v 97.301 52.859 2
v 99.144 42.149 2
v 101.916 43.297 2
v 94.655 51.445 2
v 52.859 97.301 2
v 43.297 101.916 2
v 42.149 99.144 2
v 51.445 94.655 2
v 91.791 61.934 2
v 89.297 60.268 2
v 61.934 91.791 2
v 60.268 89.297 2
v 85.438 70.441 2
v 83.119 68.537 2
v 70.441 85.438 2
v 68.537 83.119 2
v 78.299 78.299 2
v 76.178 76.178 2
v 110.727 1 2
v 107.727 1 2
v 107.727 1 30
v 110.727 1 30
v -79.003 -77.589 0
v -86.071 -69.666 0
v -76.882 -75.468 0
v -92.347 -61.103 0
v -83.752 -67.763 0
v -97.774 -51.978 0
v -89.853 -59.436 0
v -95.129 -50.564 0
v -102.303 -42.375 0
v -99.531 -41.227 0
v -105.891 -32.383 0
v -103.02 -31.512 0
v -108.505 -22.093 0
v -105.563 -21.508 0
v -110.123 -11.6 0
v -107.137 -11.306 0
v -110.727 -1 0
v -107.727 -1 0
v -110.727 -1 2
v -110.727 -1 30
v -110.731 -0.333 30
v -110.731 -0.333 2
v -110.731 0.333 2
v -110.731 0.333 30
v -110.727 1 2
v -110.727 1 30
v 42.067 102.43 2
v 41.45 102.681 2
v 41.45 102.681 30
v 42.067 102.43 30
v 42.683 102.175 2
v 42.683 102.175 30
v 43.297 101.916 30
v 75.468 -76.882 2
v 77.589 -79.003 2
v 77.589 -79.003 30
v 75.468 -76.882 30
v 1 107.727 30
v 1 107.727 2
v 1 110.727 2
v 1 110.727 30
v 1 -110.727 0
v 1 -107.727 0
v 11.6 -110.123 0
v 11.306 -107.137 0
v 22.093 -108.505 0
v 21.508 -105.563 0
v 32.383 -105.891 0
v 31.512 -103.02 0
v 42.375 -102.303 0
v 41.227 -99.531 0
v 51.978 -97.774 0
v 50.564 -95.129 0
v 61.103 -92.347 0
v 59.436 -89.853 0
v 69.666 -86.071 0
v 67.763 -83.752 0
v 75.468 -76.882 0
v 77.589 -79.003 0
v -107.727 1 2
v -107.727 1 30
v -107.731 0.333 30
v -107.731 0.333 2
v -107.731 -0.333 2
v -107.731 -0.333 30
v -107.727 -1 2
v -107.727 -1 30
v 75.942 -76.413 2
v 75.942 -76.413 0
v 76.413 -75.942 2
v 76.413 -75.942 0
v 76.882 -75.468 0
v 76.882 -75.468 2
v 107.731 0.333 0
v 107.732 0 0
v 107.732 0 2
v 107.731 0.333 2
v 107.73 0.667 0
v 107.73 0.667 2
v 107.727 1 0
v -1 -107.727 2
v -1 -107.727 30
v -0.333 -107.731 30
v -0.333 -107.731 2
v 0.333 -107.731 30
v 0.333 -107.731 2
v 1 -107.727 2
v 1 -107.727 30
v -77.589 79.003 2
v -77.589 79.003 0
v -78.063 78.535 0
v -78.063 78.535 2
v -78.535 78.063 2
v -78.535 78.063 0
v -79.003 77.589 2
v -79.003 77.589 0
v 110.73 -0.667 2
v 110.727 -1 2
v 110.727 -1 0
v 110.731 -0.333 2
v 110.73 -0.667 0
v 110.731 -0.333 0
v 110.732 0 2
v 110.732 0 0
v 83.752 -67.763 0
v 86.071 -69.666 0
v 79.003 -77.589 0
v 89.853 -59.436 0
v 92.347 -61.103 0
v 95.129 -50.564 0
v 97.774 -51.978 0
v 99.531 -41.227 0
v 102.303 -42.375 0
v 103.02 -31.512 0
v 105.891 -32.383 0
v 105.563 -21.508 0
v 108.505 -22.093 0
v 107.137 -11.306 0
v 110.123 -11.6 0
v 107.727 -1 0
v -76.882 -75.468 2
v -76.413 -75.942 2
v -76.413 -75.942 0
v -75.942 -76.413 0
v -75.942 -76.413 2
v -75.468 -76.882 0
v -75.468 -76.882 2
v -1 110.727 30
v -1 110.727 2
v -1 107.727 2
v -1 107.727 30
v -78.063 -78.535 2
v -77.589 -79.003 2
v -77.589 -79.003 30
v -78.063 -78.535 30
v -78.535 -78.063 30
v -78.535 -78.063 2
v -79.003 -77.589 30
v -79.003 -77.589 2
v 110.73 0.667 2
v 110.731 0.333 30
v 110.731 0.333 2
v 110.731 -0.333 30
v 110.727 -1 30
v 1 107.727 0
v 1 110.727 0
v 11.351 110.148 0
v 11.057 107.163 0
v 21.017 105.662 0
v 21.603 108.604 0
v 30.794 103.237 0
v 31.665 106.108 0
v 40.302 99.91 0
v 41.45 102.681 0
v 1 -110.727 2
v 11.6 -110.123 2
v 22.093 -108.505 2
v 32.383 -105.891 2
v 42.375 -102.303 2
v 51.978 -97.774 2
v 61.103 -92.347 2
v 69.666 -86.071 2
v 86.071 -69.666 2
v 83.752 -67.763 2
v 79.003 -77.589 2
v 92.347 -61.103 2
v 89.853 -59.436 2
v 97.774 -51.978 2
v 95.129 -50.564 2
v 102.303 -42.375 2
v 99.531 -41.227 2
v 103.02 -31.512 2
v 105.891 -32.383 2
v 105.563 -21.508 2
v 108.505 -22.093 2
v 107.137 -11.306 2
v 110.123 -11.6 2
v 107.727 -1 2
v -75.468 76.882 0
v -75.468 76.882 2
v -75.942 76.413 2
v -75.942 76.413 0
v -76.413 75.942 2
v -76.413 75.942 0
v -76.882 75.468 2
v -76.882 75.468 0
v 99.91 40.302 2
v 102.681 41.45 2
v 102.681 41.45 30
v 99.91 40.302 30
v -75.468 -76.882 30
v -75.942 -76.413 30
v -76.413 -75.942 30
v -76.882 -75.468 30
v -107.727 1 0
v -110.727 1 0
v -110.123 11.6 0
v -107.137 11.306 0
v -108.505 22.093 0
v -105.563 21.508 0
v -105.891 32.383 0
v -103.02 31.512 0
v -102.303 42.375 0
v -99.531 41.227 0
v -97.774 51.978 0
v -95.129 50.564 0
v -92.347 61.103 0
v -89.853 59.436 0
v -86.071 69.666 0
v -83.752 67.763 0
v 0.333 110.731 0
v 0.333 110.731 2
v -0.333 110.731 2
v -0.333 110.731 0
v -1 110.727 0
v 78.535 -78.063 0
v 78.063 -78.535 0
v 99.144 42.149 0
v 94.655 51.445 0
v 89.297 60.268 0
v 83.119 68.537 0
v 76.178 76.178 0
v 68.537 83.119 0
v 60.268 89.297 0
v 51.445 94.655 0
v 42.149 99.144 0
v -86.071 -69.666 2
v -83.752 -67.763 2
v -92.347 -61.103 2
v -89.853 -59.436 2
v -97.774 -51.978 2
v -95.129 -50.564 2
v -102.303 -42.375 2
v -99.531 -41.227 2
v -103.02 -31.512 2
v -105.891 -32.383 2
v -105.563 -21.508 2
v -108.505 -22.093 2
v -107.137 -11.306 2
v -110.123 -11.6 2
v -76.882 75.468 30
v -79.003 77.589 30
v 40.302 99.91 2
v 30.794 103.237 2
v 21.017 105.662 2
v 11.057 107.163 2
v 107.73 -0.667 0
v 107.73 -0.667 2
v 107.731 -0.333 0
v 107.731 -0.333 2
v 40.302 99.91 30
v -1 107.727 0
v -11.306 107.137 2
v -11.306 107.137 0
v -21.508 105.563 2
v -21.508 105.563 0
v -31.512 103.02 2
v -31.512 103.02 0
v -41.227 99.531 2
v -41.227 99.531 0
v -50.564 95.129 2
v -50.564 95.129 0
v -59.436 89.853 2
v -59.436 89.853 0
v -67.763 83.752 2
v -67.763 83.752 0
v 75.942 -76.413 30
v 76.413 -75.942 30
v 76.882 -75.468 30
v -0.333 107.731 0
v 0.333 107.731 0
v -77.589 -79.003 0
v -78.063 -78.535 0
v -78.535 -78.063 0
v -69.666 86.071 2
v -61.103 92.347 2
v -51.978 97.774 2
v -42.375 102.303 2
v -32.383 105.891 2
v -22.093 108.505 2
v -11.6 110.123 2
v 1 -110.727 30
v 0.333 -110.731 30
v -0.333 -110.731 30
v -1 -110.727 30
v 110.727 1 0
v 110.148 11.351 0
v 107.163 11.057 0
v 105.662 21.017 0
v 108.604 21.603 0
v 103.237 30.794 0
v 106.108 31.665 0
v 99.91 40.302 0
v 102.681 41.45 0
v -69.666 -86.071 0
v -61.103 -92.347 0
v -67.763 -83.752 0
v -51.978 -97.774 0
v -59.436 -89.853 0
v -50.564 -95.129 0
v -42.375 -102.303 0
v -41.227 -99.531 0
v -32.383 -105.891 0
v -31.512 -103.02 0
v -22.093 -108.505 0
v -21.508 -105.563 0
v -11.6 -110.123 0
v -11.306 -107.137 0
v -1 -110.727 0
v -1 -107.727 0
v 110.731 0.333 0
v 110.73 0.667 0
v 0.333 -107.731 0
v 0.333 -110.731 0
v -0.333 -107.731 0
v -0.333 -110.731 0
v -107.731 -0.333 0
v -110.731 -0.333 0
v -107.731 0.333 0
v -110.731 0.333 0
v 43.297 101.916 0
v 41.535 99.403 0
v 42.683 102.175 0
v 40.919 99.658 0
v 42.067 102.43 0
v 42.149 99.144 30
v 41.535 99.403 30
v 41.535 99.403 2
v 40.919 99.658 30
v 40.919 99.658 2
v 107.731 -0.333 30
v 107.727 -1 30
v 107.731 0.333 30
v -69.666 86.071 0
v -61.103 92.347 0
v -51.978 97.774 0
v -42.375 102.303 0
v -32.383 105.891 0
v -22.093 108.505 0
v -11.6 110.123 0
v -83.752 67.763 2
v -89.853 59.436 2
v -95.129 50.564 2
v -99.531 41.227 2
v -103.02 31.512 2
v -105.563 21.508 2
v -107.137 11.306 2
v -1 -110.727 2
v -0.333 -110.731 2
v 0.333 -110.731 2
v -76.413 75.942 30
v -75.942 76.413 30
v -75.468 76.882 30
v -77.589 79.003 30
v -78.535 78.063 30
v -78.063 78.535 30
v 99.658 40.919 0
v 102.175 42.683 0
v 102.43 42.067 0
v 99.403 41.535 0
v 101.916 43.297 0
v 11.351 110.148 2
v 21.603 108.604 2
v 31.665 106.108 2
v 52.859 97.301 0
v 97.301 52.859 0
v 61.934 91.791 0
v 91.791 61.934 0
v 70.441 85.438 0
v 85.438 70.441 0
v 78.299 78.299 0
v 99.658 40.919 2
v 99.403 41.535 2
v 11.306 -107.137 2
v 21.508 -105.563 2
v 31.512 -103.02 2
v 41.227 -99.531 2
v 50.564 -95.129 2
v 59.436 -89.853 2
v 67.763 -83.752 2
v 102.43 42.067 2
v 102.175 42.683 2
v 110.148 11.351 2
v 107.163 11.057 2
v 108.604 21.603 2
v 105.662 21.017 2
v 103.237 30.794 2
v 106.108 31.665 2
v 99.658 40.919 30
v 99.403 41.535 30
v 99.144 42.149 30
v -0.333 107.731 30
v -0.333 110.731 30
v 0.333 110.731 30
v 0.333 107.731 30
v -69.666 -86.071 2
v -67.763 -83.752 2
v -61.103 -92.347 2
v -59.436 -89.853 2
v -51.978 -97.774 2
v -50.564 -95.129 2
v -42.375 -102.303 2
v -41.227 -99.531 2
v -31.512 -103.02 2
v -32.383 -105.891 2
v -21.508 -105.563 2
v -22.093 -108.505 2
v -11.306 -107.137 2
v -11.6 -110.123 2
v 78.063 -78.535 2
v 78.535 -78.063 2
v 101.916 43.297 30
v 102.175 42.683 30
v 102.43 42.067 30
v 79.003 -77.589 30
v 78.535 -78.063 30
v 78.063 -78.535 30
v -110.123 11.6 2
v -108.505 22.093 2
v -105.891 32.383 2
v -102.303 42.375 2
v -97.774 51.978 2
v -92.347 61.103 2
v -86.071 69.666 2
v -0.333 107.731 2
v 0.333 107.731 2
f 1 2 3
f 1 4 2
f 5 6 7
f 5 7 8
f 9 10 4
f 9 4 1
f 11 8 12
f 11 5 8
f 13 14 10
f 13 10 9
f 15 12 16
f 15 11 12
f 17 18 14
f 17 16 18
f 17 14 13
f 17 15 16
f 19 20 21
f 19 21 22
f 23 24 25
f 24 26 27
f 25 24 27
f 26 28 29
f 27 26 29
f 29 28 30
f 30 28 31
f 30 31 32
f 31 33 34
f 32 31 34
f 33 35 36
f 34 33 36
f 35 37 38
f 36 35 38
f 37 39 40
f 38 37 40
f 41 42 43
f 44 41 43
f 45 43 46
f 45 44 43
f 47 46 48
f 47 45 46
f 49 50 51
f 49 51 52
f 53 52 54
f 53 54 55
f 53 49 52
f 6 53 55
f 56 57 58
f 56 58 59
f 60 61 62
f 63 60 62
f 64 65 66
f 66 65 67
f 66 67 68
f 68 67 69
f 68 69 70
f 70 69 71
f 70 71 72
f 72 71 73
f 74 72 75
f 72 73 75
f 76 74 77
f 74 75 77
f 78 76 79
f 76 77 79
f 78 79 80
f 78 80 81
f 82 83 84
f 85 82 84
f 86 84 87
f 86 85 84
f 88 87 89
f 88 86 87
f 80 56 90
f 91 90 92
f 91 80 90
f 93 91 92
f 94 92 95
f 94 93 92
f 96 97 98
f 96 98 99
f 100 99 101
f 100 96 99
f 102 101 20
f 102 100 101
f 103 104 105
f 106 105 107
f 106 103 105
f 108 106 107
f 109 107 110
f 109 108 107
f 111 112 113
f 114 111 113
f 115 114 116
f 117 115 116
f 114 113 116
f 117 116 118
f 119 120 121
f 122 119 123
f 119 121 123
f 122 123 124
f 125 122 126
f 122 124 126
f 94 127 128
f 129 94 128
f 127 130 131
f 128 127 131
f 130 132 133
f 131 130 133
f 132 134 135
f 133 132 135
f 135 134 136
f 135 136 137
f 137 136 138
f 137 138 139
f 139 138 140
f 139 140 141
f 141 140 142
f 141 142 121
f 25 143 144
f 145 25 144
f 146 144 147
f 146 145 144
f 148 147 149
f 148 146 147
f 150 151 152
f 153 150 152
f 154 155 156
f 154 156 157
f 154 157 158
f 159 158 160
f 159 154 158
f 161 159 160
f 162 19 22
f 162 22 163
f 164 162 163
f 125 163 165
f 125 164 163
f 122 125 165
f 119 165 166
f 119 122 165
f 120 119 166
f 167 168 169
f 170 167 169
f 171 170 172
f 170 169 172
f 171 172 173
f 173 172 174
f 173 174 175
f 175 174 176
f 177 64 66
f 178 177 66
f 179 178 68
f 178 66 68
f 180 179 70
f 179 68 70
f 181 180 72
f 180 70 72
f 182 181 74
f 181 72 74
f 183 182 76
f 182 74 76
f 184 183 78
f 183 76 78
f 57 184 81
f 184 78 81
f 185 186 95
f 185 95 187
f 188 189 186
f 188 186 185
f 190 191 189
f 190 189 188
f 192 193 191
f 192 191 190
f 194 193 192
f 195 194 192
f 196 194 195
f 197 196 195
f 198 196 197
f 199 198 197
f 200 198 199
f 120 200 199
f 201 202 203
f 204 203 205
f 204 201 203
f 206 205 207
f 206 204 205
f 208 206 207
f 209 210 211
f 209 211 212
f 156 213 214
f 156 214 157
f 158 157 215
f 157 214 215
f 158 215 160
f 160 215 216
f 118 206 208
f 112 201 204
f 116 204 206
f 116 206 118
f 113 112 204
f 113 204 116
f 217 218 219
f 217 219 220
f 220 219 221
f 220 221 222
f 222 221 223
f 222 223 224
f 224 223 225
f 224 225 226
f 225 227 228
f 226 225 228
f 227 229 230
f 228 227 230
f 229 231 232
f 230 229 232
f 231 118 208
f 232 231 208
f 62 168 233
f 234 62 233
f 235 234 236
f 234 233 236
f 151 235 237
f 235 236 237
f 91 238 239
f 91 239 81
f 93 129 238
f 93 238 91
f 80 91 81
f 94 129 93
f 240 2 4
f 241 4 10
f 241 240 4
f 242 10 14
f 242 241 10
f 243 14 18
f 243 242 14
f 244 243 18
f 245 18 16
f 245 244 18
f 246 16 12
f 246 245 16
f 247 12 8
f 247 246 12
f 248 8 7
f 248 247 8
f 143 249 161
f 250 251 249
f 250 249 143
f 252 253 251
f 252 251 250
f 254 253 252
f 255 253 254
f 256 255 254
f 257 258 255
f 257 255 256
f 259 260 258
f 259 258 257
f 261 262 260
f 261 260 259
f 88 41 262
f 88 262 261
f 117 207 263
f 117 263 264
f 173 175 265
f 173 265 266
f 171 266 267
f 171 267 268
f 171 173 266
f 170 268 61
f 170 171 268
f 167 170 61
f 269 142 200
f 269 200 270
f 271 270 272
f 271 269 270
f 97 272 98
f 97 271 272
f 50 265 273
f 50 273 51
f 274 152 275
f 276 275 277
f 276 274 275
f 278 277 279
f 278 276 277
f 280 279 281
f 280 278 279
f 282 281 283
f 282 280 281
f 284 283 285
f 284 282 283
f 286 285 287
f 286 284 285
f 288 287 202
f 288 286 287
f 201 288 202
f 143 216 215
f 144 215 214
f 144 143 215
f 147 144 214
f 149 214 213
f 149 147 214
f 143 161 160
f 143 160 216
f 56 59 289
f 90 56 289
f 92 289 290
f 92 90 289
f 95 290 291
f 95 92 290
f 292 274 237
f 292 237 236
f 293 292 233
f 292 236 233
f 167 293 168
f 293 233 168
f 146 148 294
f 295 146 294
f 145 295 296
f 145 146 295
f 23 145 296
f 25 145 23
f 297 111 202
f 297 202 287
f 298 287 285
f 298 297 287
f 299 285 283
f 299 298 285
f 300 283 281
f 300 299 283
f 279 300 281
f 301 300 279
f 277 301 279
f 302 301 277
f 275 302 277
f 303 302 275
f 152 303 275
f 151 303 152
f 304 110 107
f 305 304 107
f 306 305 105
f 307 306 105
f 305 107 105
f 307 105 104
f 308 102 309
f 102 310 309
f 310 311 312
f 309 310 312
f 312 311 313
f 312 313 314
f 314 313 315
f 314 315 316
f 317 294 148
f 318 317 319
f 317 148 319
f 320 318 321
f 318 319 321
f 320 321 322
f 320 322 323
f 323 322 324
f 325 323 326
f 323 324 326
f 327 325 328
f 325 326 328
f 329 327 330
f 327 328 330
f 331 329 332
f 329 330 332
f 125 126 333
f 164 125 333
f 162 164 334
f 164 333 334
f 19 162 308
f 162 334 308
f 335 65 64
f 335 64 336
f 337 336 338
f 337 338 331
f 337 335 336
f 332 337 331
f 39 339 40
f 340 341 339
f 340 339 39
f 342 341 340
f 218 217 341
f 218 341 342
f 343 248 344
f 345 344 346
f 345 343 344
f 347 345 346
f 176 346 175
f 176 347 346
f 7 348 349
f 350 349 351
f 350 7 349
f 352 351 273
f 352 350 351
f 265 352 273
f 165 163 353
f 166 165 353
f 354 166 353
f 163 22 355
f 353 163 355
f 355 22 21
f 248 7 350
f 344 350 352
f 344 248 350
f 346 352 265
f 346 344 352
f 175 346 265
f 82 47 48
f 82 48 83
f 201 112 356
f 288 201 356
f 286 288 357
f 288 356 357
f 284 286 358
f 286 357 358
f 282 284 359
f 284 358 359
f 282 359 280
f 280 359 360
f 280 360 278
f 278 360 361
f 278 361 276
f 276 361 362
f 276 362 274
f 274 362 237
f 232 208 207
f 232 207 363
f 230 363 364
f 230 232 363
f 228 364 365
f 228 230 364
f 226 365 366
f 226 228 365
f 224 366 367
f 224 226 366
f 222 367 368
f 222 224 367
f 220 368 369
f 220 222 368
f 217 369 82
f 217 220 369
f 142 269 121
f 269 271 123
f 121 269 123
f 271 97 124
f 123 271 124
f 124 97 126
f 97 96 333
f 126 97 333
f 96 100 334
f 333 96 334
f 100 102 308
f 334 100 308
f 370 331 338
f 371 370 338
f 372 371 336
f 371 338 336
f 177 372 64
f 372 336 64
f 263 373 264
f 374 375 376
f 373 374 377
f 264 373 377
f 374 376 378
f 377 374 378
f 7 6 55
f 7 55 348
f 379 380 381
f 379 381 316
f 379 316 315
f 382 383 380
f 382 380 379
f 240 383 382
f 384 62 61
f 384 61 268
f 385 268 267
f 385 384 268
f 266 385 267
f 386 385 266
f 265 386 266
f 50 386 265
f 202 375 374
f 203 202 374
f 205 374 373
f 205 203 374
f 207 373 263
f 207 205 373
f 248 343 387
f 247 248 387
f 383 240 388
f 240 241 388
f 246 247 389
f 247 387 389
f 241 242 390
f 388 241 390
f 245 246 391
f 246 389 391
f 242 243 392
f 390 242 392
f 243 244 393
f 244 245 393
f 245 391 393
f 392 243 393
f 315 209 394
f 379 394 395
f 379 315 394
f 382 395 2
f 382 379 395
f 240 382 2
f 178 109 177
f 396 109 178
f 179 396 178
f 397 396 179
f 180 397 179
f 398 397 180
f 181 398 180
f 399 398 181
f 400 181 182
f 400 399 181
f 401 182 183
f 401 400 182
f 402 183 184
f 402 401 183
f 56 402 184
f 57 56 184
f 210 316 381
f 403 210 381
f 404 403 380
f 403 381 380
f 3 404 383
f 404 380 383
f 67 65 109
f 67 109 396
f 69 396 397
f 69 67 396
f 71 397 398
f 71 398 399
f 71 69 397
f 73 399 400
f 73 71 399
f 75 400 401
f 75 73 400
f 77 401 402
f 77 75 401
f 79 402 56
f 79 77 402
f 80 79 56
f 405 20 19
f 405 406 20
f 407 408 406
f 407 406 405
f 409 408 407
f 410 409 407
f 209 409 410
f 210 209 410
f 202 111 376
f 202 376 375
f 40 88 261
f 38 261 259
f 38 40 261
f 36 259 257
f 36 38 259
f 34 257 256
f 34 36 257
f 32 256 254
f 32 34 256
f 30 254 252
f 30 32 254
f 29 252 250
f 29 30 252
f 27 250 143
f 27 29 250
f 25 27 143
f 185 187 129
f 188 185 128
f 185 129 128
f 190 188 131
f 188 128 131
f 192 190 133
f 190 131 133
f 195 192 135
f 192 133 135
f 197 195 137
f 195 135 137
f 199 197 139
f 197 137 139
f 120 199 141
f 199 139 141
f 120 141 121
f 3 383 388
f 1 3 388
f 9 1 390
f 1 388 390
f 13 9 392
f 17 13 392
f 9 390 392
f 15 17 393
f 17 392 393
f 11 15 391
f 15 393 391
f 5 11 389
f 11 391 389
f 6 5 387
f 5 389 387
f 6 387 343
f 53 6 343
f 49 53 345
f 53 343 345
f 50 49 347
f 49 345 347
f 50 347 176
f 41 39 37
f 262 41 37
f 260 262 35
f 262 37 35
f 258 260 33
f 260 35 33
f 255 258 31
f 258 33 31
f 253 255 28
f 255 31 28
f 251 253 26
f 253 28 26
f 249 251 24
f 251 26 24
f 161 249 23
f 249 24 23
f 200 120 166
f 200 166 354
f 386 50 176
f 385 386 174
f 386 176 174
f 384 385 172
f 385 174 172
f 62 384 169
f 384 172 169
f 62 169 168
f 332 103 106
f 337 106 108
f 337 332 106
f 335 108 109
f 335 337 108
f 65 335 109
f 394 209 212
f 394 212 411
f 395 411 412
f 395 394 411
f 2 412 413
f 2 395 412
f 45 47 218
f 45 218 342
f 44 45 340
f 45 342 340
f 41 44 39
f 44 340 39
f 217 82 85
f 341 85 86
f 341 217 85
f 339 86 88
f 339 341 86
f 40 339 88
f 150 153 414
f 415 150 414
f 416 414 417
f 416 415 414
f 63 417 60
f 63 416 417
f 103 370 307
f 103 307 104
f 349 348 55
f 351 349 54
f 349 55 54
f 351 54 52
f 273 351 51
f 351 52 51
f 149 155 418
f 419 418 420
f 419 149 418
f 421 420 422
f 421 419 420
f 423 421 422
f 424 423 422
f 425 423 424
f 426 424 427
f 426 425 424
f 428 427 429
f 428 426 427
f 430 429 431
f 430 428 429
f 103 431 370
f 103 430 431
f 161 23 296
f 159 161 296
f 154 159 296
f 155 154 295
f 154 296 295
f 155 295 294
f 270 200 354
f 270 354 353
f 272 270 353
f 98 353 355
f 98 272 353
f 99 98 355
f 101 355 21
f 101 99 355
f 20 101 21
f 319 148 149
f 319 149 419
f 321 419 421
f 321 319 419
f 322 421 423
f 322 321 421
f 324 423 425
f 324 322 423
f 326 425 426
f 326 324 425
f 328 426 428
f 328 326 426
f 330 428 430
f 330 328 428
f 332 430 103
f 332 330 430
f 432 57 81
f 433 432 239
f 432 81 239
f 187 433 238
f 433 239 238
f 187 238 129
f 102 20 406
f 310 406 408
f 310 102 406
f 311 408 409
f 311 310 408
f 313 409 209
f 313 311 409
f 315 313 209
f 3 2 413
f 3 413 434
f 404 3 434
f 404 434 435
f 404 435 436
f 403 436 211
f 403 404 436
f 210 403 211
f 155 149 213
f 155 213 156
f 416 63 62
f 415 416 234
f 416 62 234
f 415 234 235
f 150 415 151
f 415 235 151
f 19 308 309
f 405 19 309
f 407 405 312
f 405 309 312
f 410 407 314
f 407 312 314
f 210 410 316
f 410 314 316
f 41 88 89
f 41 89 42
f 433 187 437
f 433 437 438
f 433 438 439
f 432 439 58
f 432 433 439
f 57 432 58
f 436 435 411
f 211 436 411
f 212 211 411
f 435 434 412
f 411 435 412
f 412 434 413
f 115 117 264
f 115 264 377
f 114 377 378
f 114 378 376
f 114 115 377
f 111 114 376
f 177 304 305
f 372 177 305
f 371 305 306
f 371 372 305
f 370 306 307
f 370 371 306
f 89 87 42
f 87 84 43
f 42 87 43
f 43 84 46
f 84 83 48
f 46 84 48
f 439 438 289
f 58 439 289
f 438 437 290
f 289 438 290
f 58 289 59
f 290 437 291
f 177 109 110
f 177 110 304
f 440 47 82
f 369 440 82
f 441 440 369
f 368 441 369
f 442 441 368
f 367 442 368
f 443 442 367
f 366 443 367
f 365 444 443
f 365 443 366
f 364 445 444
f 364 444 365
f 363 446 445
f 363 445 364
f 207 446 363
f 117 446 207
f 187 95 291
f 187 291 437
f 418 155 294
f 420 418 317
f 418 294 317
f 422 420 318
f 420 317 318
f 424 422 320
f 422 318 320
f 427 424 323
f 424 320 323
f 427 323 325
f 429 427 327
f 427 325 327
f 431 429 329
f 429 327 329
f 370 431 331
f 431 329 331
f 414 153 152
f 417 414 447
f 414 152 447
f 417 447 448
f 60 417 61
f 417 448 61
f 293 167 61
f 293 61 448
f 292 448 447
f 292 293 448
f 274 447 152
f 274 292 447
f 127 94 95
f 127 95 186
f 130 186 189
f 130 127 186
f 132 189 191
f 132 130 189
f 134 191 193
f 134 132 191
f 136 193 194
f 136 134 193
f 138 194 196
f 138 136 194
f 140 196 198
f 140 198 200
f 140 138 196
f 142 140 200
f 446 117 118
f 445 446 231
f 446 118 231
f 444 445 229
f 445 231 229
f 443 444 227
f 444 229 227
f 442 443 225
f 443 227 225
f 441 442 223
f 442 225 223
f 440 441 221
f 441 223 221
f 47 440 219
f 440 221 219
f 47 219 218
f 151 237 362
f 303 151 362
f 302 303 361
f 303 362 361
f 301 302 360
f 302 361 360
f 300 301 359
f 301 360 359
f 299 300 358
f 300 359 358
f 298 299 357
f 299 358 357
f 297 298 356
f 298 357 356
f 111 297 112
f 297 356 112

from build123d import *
from build123d.topology import SkipClean

# Parameters (mm, degrees)
SKETCH1_R           = 110.731806219
SKETCH1_R_2         = 107.731806219
BOSS_EXTRUDE1_DEPTH = 2
BOSS_EXTRUDE3_DEPTH = 30


with BuildPart() as part:
    # Sketch1 → Boss-Extrude1 (new body)
    with BuildSketch(Plane.XY):
        Circle(SKETCH1_R)
        Circle(SKETCH1_R_2, mode=Mode.SUBTRACT)
    extrude(amount=BOSS_EXTRUDE1_DEPTH)

    # Sketch3 → Boss-Extrude3 (add)
    with SkipClean():  # the faces are left unmerged after this step: merging them gives an invalid solid
        with BuildSketch(Plane.XY):
            with BuildLine():
                Line((1, 107.727164964), (1, 110.727290712))
                ThreePointArc((1, 110.727290712), (0, 110.731806219), (-1, 110.727290712))
                Line((-1, 110.727290712), (-1, 107.727164964))
                ThreePointArc((-1, 107.727164964), (0, 107.731806219), (1, 107.727164964))
            make_face()
            with BuildLine():
                Line((107.727164964, 1), (110.727290712, 1))
                ThreePointArc((110.727290712, 1), (110.731806219, 0), (110.727290712, -1))
                Line((110.727290712, -1), (107.727164964, -1))
                ThreePointArc((107.727164964, -1), (107.731806219, 0), (107.727164964, 1))
            make_face()
            with BuildLine():
                Line((76.881715645, -75.467502083), (79.003124906, -77.588911344))
                ThreePointArc((79.003124906, -77.588911344), (78.29921107, -78.29921107), (77.588911344, -79.003124906))
                Line((77.588911344, -79.003124906), (75.467502083, -76.881715645))
                ThreePointArc((75.467502083, -76.881715645), (76.177890727, -76.177890727), (76.881715645, -75.467502083))
            make_face()
            with BuildLine():
                Line((1, -107.727164964), (1, -110.727290712))
                ThreePointArc((1, -110.727290712), (0, -110.731806219), (-1, -110.727290712))
                Line((-1, -110.727290712), (-1, -107.727164964))
                ThreePointArc((-1, -107.727164964), (0, -107.731806219), (1, -107.727164964))
            make_face()
            with BuildLine():
                Line((-75.467502083, -76.881715645), (-77.588911344, -79.003124906))
                ThreePointArc((-77.588911344, -79.003124906), (-78.29921107, -78.29921107), (-79.003124906, -77.588911344))
                Line((-79.003124906, -77.588911344), (-76.881715645, -75.467502083))
                ThreePointArc((-76.881715645, -75.467502083), (-76.177890727, -76.177890727), (-75.467502083, -76.881715645))
            make_face()
            with BuildLine():
                Line((-107.727164964, -1), (-110.727290712, -1))
                ThreePointArc((-110.727290712, -1), (-110.731806219, 0), (-110.727290712, 1))
                Line((-110.727290712, 1), (-107.727164964, 1))
                ThreePointArc((-107.727164964, 1), (-107.731806219, 0), (-107.727164964, -1))
            make_face()
            with BuildLine():
                Line((-76.881715645, 75.467502083), (-79.003124906, 77.588911344))
                ThreePointArc((-79.003124906, 77.588911344), (-78.29921107, 78.29921107), (-77.588911344, 79.003124906))
                Line((-77.588911344, 79.003124906), (-75.467502083, 76.881715645))
                ThreePointArc((-75.467502083, 76.881715645), (-76.177890727, 76.177890727), (-76.881715645, 75.467502083))
            make_face()
            with BuildLine():
                Line((99.144239373, 42.14928078), (101.915994147, 43.297379199))
                ThreePointArc((101.915994147, 43.297379199), (102.302849363, 42.375227676), (102.681361012, 41.449620134))
                Line((102.681361012, 41.449620134), (99.909606238, 40.301521715))
                ThreePointArc((99.909606238, 40.301521715), (99.531210766, 41.227177379), (99.144239373, 42.14928078))
            make_face()
            with BuildLine():
                Line((40.301521715, 99.909606238), (41.449620134, 102.681361012))
                ThreePointArc((41.449620134, 102.681361012), (42.375227676, 102.302849363), (43.297379199, 101.915994147))
                Line((43.297379199, 101.915994147), (42.14928078, 99.144239373))
                ThreePointArc((42.14928078, 99.144239373), (41.227177379, 99.531210766), (40.301521715, 99.909606238))
            make_face()
        extrude(amount=BOSS_EXTRUDE3_DEPTH)


solid = part.part
